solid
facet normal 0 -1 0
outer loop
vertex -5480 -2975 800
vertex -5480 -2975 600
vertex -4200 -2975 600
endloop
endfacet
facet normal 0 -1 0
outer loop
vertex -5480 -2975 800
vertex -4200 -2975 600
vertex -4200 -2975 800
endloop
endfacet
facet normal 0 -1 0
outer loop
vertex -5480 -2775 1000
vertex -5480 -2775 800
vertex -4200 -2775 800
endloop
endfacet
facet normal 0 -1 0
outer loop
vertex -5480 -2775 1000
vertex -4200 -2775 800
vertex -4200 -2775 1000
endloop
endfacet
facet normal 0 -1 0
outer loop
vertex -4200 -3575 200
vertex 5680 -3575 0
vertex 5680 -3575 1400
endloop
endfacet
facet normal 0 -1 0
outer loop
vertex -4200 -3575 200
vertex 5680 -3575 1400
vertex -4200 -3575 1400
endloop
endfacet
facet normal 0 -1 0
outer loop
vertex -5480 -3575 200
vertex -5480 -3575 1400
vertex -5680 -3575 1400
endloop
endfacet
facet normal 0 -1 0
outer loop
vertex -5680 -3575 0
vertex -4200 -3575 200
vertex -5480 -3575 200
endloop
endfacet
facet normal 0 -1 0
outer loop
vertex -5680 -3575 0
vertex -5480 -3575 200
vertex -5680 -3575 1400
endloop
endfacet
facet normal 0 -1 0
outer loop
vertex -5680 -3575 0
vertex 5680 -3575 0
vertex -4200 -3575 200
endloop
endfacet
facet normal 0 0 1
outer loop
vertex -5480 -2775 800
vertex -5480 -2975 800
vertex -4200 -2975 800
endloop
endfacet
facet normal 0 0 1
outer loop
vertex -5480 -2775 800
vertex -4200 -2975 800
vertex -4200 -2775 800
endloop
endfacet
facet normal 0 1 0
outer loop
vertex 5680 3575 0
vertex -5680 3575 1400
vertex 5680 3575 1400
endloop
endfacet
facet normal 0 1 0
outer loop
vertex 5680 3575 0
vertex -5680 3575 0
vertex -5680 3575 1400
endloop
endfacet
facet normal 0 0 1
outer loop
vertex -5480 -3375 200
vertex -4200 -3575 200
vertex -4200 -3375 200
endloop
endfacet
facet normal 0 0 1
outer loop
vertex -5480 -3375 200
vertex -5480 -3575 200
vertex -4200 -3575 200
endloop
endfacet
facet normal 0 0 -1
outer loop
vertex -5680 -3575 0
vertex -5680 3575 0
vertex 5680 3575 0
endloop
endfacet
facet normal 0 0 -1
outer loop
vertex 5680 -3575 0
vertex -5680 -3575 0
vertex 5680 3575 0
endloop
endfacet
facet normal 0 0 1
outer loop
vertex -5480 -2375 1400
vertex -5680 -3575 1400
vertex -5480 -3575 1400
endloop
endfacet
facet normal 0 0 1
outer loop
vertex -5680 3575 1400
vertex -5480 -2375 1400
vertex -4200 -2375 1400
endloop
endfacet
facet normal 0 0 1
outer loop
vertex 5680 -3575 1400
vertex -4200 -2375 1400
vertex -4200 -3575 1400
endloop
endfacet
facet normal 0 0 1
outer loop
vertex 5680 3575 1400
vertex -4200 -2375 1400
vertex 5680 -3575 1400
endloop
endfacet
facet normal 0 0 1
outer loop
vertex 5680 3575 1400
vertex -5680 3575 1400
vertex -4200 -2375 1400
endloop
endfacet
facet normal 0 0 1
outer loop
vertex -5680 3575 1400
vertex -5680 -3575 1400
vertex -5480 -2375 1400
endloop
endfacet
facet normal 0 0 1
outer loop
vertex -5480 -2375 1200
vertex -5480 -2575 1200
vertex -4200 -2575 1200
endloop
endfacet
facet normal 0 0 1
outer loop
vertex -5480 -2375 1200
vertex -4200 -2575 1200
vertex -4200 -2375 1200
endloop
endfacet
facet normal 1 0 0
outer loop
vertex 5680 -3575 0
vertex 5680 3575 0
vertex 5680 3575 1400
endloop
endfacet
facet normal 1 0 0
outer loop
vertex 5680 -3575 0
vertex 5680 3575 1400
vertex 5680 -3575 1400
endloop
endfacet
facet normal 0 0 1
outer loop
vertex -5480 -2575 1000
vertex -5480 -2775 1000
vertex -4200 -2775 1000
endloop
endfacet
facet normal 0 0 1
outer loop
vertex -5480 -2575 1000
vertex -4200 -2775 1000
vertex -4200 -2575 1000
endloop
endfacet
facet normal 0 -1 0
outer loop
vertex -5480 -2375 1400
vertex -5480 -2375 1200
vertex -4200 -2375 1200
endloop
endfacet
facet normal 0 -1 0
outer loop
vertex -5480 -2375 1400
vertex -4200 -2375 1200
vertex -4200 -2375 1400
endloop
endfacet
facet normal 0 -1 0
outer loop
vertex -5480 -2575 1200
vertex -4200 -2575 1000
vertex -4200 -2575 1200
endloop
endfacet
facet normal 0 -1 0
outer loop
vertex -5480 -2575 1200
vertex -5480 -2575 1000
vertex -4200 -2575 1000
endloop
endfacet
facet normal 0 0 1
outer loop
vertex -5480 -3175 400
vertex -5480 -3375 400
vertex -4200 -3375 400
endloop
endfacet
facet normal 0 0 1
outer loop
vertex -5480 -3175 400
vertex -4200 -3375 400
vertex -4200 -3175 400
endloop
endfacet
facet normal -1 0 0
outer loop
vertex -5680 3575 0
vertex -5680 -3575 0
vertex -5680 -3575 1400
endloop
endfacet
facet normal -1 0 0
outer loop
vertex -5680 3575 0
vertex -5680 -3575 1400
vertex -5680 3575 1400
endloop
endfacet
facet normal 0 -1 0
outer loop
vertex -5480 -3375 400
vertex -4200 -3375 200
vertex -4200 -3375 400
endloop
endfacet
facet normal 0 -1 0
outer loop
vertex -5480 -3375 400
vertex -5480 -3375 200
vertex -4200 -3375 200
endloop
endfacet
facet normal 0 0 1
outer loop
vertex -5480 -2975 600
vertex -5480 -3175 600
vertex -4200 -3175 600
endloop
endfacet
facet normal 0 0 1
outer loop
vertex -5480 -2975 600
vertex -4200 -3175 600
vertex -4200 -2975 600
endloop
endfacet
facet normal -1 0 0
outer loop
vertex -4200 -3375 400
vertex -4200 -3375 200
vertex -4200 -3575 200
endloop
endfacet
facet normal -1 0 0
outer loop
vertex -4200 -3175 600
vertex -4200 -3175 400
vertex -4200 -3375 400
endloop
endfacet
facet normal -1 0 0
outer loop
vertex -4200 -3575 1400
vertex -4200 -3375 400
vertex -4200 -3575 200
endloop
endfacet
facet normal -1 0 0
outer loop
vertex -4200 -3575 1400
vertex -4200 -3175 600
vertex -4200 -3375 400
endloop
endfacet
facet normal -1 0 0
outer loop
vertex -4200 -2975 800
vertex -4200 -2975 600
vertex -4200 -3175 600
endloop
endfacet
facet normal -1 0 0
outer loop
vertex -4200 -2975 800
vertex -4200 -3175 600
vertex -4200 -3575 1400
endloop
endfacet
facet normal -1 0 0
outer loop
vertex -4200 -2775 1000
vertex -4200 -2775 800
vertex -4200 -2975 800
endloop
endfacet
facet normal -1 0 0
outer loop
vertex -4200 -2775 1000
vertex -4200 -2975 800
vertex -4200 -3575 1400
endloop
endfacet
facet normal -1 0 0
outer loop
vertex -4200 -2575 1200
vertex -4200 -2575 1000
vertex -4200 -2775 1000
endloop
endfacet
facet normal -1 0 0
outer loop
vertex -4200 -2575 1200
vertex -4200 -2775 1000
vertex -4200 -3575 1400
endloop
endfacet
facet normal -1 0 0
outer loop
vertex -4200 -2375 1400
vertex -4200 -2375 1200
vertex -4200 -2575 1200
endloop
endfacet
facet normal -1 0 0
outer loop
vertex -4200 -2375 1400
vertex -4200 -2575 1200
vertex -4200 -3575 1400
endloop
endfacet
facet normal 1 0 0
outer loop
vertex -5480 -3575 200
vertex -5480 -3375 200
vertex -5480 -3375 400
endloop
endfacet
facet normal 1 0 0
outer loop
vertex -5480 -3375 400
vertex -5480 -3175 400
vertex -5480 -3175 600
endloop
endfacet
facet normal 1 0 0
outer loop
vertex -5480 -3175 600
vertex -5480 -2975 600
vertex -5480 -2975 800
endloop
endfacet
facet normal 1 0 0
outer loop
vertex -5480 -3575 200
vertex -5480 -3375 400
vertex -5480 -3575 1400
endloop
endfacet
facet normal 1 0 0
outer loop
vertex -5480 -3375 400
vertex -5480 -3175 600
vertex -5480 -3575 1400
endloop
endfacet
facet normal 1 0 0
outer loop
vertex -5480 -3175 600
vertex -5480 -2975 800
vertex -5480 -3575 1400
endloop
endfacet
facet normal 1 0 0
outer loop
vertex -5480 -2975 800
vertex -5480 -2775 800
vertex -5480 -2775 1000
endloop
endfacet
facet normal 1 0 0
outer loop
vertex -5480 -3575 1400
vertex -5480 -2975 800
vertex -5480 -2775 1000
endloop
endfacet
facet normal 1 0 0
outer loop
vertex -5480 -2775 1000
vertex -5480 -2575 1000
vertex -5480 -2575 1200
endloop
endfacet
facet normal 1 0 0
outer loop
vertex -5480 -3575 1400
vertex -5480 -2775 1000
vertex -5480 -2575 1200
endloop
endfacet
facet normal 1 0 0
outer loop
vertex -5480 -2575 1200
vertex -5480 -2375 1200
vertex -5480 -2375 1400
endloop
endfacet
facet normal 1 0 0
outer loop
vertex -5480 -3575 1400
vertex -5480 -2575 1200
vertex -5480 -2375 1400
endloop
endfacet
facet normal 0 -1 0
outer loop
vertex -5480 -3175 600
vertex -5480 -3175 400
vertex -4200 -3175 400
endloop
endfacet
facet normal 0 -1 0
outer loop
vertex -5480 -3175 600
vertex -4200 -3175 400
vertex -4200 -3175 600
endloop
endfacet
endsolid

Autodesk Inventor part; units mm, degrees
ref_plane "YZ Plane" through (0, 0, 0) normal (1, 0, 0) x (0, 1, 0)
ref_plane "XZ Plane" through (0, 0, 0) normal (0, 1, 0) x (-1, 0, 0)
ref_plane "XY Plane" through (0, 0, 0) normal (0, 0, 1) x (1, 0, 0)
sketch "Skizze1" plane through (0, 0, 0) normal (0, 0, 1) x (1, 0, 0)
  line L0 (-5680, 3575) -> (5680, 3575)
  line L1 (5680, 3575) -> (5680, -3575)
  line L2 (5680, -3575) -> (-5680, -3575)
  line L3 (-5680, -3575) -> (-5680, 3575)
  line L4 (-7952, 0) -> (7952, 0) projected
  line L5 (0, -5005) -> (0, 5005) projected
  dimension "d0" = 11360
  dimension "d1" = 7150
extrude "Extrusion1" add sketch "Skizze1" along normal blind 1400
ref_plane "Arbeitsebene1" through (-5480, -3575, 0) normal (-1, 0, 0) x (0, 0, 1)
sketch "Skizze2" plane through (-5480, -3575, 0) normal (-1, 0, 0) x (0, 0, 1)
  line L0 (0, 7150) -> (0, 0) projected
  line L1 (0, 7150) -> (1400, 7150) projected
  line L2 (1400, 0) -> (1400, 7150) projected
  line L3 (0, 0) -> (1400, 0) projected
  line L4 (0, 0) -> (200, 0)
  line L5 (0, 0) -> (1400, 0) projected
  line L6 (200, 0) -> (200, 200)
  line L7 (200, 200) -> (400, 200)
  line L8 (400, 200) -> (400, 400)
  line L9 (400, 400) -> (600, 400)
  line L10 (600, 400) -> (600, 600)
  line L11 (600, 600) -> (800, 600)
  line L12 (800, 600) -> (800, 800)
  line L13 (800, 800) -> (1000, 800)
  line L14 (1400, 0) -> (1400, 7150) projected
  line L15 (1400, 0) -> (200, 0)
  line L16 (1000, 800) -> (1000, 1000)
  line L17 (1000, 1000) -> (1200, 1000)
  line L18 (1200, 1000) -> (1200, 1200)
  line L19 (1200, 1200) -> (1400, 1200)
  line L20 (1400, 7150) -> (1400, 0) projected
  line L21 (1400, 1200) -> (1400, 0)
  dimension "d5" = 200
  dimension "d6" = 200
  dimension "d7" = 200
  dimension "d8" = 200
  dimension "d9" = 200
  dimension "d10" = 200
  dimension "d11" = 200
  dimension "d12" = 200
  dimension "d15" = 200
  dimension "d16" = 200
  dimension "d17" = 200
  dimension "d18" = 200
extrude "Extrusion3" cut sketch "Skizze2" against normal blind 1280 contours L6 L7 L8 L9 L10 L11 L12 L13 L16 L17 L18 L19 L2 L3
sketch "Skizze4" plane through (0, 0, 1400) normal (0, 0, 1) x (1, 0, 0)
  line L0 (-5480, -3575) -> (-5480, -2375) projected
  line L1 (-5480, -2375) -> (-4200, -2375) projected
  line L2 (-4200, -2375) -> (-4200, -3575) projected
  line L3 (-4200, -3575) -> (5680, -3575) projected
  line L4 (5680, -3575) -> (5680, 3575) projected
  line L5 (5680, 3575) -> (-5680, 3575) projected
  line L6 (-5680, 3575) -> (-5680, -3575) projected
  line L7 (-5680, -3575) -> (-5480, -3575) projected
  line L8 (-5680, -3575) -> (-5680, 3575) projected
  line L9 (-5680, -3575) -> (-5680, 3575)
  line L10 (-5680, 3575) -> (5680, 3575) projected
  line L11 (-5680, 3575) -> (5680, 3575)
  line L12 (5680, -3575) -> (-5680, -3575) projected
  line L13 (5680, 3575) -> (5680, -3575)
  line L14 (5680, -3575) -> (-4200, -3575)
  line L15 (-4200, -3575) -> (-4200, -2275)
  line L16 (-4200, -2275) -> (-5480, -2275)
  line L17 (-5480, -3575) -> (-5480, -2375) projected
  line L18 (-5480, -2275) -> (-5480, -3575)
  line L19 (-5480, -3575) -> (-5680, -3575)
  line L20 (-5680, 3575) -> (-5680, -3575)
  line L21 (-5480, -2275) -> (-5480, 3375)
  line L22 (-5480, 3375) -> (5480, 3375)
  line L23 (5480, 3375) -> (5480, -3375)
  line L24 (5480, -3375) -> (-4000, -3375)
  line L25 (-4000, -3375) -> (-4000, -2075)
  line L26 (-4000, -2075) -> (-5480, -2075)
  dimension "d41" = 200
  dimension "d42" = 200
  dimension "d43" = 200
  dimension "d44" = 200
  dimension "d45" = 200
  dimension "d46" = 1300
sketch "Skizze5" plane through (0, 0, 1400) normal (0, 0, 1) x (1, 0, 0)
  line L0 (-5480, -2075) -> (-5480, 3375) projected
  line L1 (-5480, 3375) -> (5480, 3375) projected
  line L2 (5480, 3375) -> (5480, -3375) projected
  line L3 (5480, -3375) -> (-4000, -3375) projected
  line L4 (-4000, -3375) -> (-4000, -2075) projected
  line L5 (-4000, -2075) -> (-5480, -2075) projected
  line L6 (-4200, -3575) -> (5680, -3575) projected
  line L7 (5680, -3575) -> (5680, 3575) projected
  line L8 (5680, 3575) -> (-5680, 3575) projected
  line L9 (-5680, 3575) -> (-5680, -3575) projected
  line L10 (-5680, -3575) -> (-5480, -3575) projected
  line L11 (-5480, -3575) -> (-5480, -2275) projected
  line L12 (-5480, -2275) -> (-4200, -2275) projected
  line L13 (-4200, -2275) -> (-4200, -3575) projected
  line L14 (5480, 3375) -> (5480, -3375) projected
  line L15 (-1140, -3375) -> (-1140, 25)
  line L16 (-1140, 25) -> (5480, 25)
  line L17 (-1340, -3375) -> (-1340, 25)
  line L18 (-1340, 25) -> (-2310, 25)
  line L19 (-2310, 25) -> (-2310, 225)
  line L20 (-2310, 225) -> (5480, 225)
  line L21 (-5480, 1775) -> (-1430, 1775)
  line L22 (-1430, 1775) -> (-1430, 3375)
  line L23 (-5480, 1575) -> (-1230, 1575)
  line L24 (-1230, 1575) -> (-1230, 3375)
  line L25 (-5480, 1575) -> (-5480, 1775)
  line L26 (-1430, 3375) -> (-1230, 3375)
  line L27 (-1330, -3375) -> (-1140, -3375)
  line L28 (5480, 225) -> (5480, 25)
  line L29 (5680, 3575) -> (5680, -3575) projected
  line L30 (5480, 3375) -> (-5480, 3375) projected
  line L31 (1630, 3375) -> (1630, 225)
  line L32 (1430, 3375) -> (1430, 225)
  line L33 (1430, 3375) -> (1630, 3375)
  dimension "d49" = 200
  dimension "d50" = 200
  dimension "d51" = 6620
  dimension "d52" = 3400
  dimension "d53" = 970
  dimension "d54" = 1600
  dimension "d55" = 200
  dimension "d56" = 4050
  dimension "d57" = 200
  dimension "d60" = 3850
  dimension "d61" = 200
equation "\"d6\" = d5"
equation "\"d7\" = d5"
equation "\"d8\" = d5"
equation "\"d10\" = d9"
equation "\"d11\" = d9"
equation "\"d12\" = d9"
equation "\"d15\" = d6"
equation "\"d16\" = d9"
equation "\"d17\" = d9"
equation "\"d18\" = d9"
properties part number "Grundriss_Haus" material "Beton, Poren"
